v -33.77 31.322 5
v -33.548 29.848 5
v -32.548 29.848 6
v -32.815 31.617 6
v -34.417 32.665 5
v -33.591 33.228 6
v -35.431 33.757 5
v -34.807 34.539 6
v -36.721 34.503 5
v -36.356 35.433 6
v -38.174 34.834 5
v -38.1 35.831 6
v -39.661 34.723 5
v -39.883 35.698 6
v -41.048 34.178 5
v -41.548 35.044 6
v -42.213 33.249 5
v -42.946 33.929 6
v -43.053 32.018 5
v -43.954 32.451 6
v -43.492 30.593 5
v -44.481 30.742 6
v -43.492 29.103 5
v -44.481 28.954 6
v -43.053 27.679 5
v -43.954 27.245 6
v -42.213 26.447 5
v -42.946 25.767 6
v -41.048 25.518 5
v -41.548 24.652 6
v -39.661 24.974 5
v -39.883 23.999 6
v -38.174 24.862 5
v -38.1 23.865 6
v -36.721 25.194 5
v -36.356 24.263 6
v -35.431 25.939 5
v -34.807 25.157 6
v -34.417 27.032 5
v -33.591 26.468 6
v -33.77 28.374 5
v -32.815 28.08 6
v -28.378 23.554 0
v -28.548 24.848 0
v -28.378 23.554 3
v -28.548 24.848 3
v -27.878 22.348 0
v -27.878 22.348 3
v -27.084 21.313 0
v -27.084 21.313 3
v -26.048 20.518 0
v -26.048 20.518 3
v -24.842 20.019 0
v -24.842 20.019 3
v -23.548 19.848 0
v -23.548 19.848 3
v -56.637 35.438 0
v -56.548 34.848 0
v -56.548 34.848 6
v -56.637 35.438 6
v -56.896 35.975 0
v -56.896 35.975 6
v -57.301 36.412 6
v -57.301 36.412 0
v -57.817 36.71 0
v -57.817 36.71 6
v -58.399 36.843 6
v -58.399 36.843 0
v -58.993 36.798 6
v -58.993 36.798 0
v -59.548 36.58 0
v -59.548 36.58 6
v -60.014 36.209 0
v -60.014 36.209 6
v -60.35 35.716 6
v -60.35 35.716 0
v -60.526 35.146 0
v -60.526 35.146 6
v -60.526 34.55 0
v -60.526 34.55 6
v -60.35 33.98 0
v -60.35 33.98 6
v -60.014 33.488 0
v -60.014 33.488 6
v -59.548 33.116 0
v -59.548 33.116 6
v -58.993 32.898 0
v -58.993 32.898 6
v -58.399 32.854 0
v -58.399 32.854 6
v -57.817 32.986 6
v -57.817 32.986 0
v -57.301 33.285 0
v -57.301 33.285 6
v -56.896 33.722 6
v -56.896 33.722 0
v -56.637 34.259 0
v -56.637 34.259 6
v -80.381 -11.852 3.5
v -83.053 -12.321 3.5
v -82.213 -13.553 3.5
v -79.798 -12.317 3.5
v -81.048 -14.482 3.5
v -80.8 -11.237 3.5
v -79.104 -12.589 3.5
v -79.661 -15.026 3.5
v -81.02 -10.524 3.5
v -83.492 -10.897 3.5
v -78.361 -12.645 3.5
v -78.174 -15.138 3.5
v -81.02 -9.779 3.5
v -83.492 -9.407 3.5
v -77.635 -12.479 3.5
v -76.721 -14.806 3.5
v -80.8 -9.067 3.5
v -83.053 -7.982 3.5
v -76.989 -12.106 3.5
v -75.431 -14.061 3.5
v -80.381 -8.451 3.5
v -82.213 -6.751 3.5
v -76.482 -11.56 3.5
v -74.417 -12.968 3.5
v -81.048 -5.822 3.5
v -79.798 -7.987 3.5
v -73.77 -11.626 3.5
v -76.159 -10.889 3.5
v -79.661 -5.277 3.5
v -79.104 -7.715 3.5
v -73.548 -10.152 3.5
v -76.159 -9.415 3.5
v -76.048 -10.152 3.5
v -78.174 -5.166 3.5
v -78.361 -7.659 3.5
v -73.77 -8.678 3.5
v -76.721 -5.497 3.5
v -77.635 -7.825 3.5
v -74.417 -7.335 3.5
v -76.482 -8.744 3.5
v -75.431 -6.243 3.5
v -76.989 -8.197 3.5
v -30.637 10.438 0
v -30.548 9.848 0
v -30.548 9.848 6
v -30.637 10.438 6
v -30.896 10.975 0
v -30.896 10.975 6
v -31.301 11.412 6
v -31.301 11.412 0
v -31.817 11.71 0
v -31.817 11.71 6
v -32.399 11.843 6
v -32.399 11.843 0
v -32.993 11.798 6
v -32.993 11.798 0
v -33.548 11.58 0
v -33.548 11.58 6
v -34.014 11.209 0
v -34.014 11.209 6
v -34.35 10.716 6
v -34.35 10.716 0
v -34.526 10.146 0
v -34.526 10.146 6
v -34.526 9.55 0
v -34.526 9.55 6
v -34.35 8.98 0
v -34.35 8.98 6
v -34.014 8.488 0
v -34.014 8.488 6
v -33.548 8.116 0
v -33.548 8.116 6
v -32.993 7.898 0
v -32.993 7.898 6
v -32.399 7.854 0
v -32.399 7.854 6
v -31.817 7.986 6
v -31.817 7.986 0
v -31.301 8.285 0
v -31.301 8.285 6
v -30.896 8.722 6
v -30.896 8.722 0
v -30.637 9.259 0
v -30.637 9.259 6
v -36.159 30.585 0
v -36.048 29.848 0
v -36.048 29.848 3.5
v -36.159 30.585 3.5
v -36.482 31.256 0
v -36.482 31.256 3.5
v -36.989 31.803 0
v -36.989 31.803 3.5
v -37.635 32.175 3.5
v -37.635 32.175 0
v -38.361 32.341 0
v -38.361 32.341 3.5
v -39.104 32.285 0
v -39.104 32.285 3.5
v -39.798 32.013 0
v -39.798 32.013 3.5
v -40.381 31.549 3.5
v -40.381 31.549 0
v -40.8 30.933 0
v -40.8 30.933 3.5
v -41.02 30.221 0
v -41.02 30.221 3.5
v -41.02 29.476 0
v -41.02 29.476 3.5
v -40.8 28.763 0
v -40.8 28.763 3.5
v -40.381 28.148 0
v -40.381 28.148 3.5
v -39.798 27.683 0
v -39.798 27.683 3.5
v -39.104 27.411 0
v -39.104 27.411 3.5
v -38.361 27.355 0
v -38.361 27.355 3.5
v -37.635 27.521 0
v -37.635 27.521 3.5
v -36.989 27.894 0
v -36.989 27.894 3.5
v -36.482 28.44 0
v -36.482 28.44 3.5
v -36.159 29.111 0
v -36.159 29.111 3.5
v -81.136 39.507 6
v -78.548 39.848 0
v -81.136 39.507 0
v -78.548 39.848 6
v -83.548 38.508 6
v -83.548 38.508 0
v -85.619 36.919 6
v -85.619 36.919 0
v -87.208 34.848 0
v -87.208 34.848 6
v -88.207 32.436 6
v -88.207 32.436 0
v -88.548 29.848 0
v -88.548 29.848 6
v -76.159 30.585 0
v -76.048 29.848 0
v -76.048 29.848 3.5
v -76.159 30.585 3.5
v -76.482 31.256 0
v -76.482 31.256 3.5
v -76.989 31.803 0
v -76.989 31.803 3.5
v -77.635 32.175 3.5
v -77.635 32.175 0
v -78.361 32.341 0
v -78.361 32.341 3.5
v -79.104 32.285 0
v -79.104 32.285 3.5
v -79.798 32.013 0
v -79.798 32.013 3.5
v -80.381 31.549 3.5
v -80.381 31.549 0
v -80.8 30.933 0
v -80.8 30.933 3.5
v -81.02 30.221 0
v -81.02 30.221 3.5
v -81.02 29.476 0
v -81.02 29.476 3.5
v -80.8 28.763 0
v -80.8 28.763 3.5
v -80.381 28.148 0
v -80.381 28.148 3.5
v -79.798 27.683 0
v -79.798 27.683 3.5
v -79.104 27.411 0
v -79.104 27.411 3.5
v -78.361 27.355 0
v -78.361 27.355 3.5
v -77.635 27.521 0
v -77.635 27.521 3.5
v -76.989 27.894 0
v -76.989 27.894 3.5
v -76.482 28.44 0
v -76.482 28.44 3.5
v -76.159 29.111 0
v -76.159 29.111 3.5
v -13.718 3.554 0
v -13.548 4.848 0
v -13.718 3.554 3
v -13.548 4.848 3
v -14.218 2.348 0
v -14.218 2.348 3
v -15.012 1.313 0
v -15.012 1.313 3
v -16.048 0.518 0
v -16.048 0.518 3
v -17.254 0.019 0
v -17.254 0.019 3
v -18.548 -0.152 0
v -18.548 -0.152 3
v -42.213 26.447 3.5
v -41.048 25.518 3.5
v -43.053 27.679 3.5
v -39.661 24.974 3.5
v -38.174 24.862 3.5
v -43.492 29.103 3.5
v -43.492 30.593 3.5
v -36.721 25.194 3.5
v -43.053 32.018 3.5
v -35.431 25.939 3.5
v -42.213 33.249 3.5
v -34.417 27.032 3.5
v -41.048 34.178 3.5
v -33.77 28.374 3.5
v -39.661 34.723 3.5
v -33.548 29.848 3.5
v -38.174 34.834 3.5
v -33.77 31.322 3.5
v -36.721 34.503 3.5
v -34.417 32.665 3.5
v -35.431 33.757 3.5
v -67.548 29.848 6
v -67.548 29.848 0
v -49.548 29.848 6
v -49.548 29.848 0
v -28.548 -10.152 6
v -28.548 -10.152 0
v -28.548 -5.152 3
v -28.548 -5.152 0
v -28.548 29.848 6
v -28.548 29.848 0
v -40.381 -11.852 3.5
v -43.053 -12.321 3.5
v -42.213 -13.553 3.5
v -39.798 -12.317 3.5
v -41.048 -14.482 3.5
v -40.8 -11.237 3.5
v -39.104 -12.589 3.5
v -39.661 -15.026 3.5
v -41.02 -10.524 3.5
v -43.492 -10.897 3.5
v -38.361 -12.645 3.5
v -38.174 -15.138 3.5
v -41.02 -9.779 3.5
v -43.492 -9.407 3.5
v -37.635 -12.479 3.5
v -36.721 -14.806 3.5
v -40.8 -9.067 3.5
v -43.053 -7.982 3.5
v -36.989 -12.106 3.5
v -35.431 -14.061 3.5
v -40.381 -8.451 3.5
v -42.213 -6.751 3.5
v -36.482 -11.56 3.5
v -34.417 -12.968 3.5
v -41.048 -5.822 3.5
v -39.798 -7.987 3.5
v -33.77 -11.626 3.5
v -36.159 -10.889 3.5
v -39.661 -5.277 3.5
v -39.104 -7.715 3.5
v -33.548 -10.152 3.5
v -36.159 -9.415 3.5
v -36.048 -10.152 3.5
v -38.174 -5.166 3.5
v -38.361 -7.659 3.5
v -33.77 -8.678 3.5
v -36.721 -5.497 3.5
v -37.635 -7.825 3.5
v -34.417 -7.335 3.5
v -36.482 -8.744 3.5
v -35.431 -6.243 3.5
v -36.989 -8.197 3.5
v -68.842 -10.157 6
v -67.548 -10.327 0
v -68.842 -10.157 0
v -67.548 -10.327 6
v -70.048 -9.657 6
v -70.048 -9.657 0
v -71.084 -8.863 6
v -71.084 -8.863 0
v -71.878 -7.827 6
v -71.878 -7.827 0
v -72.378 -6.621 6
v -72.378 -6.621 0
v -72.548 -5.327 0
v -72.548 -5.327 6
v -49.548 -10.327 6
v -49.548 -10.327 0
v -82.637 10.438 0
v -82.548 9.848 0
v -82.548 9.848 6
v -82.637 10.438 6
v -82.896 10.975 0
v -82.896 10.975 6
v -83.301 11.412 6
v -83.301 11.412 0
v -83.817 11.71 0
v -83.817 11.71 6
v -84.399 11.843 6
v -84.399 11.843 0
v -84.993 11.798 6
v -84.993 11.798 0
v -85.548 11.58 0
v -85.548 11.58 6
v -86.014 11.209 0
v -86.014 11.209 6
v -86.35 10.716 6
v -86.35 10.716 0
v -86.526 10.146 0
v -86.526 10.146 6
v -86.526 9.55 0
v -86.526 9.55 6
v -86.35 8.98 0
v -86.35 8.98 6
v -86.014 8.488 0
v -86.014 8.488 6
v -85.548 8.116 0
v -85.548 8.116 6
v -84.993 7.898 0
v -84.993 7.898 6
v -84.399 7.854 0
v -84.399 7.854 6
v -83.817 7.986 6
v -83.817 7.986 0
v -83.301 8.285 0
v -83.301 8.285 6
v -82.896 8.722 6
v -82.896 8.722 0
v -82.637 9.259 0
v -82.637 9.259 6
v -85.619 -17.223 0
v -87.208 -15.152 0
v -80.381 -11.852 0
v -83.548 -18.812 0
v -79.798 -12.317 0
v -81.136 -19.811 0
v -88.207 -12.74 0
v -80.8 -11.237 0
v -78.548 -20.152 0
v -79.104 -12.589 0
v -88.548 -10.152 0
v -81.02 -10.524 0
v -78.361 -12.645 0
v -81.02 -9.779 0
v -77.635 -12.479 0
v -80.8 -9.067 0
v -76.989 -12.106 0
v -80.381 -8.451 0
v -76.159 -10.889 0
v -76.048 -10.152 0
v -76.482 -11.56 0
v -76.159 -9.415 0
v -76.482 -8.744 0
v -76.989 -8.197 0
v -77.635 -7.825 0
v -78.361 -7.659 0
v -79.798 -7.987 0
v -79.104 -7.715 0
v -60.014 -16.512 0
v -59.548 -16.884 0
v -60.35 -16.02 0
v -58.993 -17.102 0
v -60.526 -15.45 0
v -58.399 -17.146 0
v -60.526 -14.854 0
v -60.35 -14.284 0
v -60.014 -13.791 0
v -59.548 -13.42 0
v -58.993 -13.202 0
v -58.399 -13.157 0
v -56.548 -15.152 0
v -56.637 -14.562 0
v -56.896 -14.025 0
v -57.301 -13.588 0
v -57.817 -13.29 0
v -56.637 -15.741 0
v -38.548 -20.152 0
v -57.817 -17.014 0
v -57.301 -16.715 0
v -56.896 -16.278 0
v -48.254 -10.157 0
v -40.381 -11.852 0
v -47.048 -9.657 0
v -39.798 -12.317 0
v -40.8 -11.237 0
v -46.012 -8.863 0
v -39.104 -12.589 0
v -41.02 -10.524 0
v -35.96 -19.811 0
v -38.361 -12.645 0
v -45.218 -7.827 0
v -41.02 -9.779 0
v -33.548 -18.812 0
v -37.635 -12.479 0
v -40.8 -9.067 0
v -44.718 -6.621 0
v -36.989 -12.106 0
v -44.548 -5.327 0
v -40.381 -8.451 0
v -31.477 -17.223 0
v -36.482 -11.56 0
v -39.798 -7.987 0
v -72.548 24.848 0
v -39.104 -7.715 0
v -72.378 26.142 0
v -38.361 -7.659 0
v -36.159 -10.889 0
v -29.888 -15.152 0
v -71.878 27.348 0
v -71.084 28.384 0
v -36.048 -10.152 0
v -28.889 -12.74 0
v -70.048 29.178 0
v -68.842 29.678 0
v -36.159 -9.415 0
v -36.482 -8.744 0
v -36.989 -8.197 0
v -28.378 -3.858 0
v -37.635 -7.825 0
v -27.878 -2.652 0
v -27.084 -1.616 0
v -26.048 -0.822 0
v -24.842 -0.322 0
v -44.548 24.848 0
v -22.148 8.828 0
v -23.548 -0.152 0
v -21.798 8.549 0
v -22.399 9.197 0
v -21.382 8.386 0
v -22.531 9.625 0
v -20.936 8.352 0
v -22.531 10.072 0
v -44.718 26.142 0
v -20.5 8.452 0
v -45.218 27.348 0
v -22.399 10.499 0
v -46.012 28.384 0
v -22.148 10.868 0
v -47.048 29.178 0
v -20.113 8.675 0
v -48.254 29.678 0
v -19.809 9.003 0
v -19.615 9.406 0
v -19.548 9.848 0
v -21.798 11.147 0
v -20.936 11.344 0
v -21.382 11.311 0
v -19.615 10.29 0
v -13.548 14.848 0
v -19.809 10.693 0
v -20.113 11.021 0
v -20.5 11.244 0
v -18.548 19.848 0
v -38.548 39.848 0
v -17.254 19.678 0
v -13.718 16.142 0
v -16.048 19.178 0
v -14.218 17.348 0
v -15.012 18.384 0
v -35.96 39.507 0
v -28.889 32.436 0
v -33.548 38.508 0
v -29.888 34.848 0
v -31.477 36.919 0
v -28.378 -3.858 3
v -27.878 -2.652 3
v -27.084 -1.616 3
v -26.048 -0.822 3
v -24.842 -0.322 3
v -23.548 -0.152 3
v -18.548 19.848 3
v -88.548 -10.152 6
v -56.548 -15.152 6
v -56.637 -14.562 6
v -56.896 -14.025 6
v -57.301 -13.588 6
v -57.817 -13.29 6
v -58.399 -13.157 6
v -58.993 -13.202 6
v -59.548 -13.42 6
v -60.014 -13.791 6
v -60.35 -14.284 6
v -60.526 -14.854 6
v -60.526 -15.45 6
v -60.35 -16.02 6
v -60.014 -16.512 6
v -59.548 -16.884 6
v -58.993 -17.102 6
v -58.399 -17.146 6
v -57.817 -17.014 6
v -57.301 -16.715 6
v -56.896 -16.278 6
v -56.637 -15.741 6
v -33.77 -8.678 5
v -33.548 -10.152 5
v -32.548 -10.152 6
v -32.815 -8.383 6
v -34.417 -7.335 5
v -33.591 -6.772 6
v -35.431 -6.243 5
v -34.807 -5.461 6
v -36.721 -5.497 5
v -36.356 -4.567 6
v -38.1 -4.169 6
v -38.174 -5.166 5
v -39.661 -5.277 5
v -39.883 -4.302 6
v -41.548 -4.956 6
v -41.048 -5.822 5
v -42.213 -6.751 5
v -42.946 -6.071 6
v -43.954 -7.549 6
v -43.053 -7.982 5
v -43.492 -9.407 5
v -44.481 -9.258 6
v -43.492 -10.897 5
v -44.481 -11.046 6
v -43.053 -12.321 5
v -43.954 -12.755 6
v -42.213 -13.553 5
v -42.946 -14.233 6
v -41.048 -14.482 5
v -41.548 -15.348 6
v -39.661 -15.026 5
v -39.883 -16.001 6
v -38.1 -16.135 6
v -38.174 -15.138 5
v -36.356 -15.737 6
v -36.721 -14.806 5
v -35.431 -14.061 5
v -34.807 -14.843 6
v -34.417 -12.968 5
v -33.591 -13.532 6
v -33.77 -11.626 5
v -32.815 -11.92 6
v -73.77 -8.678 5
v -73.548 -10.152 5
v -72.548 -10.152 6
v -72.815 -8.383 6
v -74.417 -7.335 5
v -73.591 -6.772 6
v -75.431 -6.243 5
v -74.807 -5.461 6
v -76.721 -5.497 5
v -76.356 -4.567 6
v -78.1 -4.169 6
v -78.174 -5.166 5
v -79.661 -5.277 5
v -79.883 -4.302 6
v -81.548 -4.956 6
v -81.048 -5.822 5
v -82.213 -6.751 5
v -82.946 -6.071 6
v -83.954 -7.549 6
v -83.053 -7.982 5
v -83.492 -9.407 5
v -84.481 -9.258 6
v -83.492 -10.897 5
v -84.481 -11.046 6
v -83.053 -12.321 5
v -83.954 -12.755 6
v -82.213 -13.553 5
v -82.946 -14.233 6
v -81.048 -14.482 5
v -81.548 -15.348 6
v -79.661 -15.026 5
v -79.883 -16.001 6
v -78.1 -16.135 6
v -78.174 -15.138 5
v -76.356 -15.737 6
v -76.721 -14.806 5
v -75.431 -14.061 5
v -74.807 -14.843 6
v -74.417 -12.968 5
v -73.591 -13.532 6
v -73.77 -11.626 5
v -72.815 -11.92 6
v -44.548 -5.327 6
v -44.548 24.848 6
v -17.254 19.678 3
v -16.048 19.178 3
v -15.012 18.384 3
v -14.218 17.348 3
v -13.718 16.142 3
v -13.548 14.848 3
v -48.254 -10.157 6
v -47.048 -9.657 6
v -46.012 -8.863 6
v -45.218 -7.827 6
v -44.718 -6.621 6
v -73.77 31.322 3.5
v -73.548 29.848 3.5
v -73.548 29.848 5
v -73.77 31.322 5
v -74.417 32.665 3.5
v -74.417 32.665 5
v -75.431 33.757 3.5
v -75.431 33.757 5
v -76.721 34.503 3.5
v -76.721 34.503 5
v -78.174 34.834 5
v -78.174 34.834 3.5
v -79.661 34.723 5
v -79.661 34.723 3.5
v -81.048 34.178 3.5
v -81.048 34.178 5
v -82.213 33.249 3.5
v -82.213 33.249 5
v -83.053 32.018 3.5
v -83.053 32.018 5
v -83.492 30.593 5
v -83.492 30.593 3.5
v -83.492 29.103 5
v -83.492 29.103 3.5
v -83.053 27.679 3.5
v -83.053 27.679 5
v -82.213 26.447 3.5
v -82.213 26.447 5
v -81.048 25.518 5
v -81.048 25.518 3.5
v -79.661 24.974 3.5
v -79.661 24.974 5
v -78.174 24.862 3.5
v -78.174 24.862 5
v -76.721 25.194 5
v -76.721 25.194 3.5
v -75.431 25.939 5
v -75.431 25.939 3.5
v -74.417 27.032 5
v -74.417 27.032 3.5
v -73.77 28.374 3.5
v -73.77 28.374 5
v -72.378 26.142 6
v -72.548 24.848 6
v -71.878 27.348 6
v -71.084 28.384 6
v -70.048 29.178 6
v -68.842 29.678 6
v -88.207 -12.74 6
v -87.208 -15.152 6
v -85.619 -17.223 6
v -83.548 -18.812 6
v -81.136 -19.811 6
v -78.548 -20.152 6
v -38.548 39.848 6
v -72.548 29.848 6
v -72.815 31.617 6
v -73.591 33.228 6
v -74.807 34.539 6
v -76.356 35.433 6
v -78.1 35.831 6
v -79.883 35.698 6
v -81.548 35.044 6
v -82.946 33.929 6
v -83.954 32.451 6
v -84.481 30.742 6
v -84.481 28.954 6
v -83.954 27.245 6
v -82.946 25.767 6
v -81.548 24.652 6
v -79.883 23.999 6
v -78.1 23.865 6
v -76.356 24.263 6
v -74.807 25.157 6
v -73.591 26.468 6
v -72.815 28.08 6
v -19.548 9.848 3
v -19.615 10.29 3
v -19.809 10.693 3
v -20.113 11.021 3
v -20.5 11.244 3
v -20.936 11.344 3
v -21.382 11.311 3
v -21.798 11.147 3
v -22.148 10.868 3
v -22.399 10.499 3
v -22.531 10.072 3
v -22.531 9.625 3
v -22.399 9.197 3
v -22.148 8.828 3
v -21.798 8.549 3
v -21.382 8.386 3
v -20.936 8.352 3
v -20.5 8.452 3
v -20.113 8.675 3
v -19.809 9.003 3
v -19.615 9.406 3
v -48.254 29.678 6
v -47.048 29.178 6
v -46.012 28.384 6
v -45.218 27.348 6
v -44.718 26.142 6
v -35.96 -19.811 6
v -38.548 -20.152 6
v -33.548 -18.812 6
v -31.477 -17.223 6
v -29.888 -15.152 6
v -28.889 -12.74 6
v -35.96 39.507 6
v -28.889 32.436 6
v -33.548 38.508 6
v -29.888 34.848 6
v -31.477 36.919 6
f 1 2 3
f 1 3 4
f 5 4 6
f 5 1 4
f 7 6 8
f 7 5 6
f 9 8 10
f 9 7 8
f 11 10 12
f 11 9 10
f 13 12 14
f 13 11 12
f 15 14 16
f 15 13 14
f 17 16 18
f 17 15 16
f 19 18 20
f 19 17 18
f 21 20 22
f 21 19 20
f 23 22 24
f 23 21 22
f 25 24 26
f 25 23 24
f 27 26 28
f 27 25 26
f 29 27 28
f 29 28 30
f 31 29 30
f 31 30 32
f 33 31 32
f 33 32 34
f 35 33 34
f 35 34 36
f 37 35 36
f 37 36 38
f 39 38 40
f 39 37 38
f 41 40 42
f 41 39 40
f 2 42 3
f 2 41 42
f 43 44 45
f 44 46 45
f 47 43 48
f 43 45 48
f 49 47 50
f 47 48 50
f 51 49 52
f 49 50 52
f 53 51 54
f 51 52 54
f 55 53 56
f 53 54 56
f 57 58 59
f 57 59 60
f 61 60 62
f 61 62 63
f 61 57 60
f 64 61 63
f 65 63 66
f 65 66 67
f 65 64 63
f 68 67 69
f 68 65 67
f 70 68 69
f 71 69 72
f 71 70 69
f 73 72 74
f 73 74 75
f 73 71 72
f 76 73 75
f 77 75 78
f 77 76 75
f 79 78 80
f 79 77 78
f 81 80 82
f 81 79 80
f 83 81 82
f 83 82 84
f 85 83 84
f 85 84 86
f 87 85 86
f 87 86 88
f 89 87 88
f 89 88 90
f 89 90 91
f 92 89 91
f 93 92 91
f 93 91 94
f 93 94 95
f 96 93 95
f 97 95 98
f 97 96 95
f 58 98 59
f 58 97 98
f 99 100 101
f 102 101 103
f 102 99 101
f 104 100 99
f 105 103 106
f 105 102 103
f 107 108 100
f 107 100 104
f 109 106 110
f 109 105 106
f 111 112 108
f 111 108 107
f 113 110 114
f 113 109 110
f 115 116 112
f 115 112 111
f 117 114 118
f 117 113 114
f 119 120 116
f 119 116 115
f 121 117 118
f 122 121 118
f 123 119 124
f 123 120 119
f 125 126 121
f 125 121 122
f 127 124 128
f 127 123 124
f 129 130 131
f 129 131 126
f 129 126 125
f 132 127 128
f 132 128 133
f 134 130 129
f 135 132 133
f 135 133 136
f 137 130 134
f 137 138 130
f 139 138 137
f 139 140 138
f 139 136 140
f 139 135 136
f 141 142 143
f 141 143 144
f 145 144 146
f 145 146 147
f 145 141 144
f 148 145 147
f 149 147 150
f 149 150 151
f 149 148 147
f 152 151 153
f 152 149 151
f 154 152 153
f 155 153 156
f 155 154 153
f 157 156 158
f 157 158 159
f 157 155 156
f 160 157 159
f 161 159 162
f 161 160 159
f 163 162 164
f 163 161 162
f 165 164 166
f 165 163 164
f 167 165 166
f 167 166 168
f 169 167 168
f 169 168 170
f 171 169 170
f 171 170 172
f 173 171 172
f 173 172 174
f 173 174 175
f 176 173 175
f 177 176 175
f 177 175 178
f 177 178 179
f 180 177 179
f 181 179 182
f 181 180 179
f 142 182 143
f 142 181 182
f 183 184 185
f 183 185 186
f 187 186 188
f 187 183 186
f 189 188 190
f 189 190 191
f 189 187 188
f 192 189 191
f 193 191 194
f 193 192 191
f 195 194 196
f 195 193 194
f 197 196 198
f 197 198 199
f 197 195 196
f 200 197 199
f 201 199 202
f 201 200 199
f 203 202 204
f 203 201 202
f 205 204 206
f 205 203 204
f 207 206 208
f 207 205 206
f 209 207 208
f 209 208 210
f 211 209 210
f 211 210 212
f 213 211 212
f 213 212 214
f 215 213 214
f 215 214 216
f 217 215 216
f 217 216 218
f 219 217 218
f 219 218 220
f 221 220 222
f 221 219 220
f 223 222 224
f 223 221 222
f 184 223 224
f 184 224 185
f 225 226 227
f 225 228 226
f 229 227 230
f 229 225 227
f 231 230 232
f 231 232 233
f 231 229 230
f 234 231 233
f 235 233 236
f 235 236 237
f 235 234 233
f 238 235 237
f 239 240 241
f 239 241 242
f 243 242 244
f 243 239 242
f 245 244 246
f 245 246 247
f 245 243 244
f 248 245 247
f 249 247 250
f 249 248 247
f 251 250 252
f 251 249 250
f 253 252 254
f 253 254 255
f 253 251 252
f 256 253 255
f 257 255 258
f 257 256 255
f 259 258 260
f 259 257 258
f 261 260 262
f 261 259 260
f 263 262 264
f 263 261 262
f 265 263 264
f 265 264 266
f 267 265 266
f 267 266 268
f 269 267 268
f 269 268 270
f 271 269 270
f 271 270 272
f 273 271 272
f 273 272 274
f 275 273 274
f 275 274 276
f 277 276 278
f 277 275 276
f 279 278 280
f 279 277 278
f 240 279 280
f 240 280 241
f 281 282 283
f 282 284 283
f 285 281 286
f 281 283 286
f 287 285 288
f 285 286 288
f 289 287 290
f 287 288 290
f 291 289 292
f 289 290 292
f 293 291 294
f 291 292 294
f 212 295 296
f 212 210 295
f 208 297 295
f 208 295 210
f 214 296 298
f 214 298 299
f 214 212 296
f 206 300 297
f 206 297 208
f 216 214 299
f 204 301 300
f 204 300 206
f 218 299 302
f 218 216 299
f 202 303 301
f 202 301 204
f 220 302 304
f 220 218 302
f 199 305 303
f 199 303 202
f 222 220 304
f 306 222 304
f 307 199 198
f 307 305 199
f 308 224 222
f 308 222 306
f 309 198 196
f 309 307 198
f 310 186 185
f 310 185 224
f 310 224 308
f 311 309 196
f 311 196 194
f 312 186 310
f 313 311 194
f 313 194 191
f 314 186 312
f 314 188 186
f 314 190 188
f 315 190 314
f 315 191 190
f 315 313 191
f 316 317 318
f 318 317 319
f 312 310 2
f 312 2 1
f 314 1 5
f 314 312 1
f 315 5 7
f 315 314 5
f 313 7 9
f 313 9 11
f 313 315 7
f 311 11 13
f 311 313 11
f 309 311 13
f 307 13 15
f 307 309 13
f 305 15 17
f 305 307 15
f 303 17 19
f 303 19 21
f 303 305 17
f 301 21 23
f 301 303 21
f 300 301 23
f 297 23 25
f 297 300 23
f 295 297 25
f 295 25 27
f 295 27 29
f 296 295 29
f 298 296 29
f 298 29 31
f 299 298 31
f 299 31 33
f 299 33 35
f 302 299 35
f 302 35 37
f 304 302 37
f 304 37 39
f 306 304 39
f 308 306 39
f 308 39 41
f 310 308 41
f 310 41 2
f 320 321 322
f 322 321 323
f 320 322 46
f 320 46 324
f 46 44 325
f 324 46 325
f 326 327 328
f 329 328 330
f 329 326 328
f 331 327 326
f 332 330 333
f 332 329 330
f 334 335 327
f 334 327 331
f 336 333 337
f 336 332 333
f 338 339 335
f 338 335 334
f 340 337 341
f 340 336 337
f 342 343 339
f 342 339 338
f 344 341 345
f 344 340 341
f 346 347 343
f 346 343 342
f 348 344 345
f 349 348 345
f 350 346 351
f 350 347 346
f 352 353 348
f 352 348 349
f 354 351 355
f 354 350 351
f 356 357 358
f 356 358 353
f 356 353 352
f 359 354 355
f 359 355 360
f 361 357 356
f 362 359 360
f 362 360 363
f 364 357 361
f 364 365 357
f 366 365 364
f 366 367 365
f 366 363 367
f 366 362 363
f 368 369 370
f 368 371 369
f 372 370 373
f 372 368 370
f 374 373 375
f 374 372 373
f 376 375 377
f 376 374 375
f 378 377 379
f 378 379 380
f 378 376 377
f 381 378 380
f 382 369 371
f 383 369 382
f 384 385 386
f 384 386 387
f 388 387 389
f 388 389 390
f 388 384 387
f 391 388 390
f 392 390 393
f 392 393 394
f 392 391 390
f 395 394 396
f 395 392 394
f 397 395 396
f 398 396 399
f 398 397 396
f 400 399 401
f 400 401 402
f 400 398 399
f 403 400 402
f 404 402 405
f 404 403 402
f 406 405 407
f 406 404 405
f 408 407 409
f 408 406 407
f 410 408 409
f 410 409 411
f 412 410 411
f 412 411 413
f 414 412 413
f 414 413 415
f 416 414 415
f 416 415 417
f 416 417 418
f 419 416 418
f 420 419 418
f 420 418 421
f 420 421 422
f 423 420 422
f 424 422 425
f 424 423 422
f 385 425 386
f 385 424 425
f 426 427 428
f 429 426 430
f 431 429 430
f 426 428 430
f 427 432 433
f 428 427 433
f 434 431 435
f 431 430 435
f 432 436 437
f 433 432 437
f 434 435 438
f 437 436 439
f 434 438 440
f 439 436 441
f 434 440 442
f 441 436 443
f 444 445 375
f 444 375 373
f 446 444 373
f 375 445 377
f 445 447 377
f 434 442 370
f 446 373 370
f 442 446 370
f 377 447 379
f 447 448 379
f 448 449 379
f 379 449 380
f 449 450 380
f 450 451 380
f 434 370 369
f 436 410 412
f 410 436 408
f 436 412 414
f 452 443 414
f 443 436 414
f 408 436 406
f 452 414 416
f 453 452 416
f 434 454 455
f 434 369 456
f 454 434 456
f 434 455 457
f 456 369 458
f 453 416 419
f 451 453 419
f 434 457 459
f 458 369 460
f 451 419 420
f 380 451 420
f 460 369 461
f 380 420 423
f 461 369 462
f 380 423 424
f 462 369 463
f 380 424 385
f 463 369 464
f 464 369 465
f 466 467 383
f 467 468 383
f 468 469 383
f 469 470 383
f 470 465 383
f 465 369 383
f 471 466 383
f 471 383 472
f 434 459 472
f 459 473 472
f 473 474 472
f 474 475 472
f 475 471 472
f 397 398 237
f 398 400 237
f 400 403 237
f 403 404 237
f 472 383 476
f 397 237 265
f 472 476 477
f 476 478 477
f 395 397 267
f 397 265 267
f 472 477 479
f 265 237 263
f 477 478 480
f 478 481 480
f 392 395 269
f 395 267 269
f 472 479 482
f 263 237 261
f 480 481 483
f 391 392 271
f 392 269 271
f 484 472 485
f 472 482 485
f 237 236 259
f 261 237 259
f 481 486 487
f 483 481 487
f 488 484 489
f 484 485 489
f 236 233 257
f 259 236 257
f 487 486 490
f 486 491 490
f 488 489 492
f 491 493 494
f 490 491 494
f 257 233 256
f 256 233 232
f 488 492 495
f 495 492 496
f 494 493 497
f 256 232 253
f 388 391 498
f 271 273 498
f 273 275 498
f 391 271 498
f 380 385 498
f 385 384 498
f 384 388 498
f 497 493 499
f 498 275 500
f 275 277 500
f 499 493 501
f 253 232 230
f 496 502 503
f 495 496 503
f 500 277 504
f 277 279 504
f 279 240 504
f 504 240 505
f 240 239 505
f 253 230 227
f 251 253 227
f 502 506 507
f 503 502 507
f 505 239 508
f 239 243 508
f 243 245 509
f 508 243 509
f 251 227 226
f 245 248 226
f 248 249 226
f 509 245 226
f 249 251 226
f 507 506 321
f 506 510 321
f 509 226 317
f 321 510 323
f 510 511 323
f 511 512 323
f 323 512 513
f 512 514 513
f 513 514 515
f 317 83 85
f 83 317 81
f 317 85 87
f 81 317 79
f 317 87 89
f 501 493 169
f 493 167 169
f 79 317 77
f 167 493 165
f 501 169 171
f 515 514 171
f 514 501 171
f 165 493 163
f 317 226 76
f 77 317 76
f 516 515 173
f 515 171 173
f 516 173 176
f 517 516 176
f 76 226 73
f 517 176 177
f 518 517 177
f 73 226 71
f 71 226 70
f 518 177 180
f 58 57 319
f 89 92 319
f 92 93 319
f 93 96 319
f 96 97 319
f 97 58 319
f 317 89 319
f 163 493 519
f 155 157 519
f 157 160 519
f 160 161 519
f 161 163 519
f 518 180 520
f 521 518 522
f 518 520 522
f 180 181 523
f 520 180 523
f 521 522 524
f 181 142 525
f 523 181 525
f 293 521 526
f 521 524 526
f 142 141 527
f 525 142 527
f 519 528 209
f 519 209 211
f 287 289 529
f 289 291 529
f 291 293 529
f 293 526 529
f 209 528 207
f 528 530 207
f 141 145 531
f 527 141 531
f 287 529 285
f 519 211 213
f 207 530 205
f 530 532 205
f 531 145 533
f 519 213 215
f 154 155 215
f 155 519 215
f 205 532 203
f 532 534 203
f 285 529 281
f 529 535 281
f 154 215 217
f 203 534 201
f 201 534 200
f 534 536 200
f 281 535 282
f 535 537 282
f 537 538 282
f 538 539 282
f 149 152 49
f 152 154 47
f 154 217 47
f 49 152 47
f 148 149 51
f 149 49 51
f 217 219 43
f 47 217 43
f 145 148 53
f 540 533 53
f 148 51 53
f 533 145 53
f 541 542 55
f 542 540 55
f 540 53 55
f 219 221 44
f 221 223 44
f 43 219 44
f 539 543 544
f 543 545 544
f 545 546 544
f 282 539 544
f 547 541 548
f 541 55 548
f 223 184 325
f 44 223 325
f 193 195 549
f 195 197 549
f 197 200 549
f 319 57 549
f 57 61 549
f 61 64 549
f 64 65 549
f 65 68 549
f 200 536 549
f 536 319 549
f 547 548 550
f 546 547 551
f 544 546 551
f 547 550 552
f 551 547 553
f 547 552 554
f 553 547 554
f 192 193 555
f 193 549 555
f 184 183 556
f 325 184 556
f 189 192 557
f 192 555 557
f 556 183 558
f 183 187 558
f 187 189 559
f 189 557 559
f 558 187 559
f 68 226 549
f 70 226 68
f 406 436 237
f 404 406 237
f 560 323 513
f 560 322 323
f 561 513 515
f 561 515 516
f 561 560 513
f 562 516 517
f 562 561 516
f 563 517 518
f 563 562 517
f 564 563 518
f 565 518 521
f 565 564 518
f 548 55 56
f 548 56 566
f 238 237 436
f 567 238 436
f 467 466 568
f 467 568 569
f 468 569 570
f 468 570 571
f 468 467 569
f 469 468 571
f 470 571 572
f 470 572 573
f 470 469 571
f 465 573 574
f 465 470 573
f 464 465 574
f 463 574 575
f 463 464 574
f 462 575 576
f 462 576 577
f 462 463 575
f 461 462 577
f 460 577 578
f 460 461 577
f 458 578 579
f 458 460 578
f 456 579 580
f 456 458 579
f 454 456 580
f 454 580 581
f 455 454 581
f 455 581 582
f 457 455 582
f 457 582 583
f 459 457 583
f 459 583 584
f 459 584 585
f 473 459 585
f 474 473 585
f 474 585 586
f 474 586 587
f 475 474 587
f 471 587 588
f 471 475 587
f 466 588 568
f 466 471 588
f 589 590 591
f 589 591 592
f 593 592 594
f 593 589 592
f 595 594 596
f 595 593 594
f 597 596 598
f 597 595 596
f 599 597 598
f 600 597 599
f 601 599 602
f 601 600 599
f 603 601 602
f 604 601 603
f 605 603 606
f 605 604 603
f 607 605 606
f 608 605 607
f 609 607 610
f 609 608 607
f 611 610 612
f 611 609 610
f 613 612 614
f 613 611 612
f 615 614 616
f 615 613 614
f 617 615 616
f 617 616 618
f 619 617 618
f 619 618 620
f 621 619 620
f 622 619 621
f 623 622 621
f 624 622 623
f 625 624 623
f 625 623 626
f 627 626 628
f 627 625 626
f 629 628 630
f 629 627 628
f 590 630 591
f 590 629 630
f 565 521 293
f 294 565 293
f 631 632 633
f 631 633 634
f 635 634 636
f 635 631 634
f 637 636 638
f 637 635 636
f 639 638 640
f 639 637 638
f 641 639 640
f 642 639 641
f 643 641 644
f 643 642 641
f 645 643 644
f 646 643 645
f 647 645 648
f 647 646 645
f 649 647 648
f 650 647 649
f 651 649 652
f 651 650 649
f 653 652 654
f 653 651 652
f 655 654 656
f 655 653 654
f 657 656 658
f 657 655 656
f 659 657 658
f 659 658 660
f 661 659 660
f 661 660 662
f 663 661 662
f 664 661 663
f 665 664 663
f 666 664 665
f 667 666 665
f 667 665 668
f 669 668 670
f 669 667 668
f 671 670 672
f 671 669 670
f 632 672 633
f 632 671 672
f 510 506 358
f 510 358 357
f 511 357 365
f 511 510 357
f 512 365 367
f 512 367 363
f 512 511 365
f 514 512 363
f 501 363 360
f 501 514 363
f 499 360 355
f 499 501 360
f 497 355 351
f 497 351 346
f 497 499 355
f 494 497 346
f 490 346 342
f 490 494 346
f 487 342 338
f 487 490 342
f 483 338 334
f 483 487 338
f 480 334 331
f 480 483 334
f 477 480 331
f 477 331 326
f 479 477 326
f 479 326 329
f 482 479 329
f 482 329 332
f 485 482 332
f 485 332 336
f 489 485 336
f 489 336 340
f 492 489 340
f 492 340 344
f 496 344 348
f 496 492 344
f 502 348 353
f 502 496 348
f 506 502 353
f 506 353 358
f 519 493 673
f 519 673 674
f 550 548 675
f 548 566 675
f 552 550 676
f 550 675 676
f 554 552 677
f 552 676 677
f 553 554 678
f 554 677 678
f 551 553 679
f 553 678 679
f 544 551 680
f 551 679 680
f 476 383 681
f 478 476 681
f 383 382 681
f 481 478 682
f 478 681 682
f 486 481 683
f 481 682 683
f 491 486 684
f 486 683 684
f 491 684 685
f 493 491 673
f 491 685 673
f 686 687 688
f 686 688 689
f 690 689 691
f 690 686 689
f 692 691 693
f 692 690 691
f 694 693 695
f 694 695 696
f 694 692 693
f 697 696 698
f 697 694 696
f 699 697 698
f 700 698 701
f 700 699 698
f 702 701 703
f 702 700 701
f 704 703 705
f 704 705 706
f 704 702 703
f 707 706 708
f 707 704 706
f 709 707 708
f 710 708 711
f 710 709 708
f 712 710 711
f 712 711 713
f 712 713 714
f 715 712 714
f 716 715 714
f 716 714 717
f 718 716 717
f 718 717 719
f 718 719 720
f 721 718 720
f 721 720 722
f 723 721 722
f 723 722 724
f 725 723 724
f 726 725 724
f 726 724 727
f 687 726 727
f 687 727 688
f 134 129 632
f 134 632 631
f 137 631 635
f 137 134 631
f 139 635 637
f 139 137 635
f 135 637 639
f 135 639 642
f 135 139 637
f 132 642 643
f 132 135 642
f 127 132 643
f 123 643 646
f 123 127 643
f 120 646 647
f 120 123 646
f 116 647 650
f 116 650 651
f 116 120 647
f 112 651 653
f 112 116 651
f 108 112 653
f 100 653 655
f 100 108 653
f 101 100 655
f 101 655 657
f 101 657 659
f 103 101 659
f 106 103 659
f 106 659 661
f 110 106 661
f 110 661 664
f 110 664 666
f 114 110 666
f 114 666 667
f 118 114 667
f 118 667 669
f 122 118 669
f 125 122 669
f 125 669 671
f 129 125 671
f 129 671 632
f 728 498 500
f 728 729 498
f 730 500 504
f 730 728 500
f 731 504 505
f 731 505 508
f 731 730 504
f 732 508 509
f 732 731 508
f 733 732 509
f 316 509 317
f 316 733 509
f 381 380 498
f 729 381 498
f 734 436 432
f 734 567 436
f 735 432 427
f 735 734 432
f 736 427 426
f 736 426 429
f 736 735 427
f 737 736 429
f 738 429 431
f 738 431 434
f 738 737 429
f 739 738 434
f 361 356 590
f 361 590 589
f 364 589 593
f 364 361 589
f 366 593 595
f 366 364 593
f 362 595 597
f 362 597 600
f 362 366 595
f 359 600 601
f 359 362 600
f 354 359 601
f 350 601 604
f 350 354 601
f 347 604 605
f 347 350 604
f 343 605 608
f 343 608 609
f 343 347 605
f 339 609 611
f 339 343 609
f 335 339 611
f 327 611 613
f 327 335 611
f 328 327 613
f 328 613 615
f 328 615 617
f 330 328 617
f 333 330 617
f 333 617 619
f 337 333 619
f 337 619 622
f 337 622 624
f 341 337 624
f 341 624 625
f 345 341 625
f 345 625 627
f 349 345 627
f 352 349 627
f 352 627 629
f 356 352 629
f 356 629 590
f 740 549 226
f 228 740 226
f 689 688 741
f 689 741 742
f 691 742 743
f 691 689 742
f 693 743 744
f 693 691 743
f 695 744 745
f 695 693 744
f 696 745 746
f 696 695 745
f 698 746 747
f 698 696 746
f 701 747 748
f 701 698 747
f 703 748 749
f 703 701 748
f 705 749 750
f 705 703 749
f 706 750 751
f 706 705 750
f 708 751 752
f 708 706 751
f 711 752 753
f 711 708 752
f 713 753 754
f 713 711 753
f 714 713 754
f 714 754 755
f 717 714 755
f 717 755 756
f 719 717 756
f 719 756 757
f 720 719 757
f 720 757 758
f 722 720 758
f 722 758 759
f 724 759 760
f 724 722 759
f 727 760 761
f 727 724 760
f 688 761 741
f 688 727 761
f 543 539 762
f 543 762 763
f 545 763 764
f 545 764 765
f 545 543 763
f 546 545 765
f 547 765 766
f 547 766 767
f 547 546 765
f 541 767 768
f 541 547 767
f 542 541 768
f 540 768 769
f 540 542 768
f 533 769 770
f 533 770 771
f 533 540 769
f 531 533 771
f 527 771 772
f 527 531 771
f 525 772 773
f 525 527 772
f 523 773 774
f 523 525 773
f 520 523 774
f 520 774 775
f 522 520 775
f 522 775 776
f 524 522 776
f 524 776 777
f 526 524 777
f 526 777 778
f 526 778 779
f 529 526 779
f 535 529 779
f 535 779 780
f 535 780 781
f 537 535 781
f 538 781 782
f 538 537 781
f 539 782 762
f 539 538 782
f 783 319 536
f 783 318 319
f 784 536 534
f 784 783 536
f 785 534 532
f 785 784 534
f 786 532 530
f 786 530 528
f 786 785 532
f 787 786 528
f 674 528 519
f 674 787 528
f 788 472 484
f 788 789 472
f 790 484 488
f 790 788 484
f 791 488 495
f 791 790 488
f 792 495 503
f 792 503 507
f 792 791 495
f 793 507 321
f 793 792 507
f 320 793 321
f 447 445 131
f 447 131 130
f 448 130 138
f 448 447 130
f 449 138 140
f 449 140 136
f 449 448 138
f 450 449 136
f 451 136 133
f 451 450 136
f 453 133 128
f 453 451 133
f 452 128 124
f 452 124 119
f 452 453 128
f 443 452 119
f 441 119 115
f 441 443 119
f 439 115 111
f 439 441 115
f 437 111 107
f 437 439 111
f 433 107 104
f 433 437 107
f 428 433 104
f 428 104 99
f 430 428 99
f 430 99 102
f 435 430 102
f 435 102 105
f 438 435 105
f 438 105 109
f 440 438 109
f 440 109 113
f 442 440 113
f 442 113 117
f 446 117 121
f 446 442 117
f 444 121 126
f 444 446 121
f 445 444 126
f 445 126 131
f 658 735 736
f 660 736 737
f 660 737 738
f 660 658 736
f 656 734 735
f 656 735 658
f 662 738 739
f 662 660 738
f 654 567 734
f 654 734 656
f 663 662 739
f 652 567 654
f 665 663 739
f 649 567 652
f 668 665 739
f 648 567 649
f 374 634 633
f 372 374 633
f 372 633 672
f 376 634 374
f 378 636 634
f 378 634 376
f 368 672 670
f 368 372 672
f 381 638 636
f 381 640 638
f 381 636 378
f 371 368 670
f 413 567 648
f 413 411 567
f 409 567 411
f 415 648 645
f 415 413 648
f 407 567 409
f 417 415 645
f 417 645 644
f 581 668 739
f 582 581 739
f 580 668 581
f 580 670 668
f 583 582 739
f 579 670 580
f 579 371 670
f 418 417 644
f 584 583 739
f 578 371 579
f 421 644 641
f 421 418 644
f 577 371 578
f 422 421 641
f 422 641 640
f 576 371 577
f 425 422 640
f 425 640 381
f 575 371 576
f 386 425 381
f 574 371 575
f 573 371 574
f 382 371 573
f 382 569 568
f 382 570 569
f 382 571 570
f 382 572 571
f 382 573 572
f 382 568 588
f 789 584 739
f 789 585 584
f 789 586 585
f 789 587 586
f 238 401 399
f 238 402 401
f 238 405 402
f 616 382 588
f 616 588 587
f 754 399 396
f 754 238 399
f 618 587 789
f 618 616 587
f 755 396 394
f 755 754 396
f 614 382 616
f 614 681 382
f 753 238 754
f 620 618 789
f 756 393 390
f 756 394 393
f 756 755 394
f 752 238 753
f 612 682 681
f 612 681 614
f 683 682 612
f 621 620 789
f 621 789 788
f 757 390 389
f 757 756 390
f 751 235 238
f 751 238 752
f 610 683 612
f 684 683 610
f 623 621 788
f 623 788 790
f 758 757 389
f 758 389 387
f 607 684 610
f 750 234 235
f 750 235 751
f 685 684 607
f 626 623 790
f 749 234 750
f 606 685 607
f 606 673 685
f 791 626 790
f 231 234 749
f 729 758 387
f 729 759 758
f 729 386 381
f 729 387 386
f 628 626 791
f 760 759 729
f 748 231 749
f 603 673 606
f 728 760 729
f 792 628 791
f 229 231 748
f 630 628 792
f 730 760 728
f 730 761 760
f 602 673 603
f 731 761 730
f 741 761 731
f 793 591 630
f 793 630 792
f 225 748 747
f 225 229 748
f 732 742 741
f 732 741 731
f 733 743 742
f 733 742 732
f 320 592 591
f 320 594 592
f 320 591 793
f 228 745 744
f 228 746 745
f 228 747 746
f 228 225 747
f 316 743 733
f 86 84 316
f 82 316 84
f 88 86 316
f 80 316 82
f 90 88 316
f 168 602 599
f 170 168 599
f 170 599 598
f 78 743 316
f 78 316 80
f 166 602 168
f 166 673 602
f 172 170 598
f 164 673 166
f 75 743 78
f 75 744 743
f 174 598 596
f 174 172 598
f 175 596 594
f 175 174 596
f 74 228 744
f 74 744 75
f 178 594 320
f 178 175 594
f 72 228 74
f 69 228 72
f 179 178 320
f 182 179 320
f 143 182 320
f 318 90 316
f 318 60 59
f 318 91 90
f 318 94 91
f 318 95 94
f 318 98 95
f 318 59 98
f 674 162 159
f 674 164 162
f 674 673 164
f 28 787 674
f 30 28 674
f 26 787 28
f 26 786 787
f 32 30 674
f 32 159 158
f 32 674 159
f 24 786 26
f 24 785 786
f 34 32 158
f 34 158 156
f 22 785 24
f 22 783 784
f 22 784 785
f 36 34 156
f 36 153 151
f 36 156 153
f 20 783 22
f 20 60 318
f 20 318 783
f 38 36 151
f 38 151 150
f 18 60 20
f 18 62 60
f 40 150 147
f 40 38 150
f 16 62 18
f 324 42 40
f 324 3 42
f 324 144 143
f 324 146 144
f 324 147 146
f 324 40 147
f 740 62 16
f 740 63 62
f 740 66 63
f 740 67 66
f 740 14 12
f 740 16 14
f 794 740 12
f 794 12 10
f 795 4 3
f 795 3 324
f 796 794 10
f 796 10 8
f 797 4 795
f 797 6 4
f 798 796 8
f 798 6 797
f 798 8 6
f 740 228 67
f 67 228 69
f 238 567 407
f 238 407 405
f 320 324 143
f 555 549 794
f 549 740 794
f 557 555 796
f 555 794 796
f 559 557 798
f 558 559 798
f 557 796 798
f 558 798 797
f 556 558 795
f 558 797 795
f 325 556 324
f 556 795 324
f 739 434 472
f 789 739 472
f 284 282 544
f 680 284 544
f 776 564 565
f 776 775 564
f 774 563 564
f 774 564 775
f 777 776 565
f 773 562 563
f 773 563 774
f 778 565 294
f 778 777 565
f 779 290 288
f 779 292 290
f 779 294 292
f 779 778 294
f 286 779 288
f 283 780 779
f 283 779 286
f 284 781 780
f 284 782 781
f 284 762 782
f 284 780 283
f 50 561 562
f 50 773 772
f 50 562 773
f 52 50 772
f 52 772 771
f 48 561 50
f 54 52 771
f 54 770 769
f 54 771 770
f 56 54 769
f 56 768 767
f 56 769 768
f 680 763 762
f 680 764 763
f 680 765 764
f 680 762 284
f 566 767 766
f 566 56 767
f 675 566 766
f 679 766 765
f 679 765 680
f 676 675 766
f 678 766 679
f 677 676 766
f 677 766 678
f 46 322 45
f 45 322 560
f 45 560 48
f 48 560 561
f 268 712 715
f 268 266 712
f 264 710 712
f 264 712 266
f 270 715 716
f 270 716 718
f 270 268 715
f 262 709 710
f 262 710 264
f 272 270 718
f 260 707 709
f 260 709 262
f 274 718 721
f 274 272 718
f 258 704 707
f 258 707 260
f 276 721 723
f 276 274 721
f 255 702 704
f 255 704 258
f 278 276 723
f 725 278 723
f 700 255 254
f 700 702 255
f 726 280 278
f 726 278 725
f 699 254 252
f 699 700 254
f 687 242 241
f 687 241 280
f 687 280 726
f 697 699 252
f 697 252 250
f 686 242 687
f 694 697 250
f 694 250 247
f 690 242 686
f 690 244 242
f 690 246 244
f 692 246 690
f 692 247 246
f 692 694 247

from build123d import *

# Parameters (mm, degrees)
F0_R     = 5
F0_R_2   = 2
F0_W     = 28
F0_H     = 40.175457
F1_DEPTH = 6
F0_R_3   = 2.5
F2_DEPTH = 3.5
F0_W_2   = 15
F0_H_2   = 20
F0_R_4   = 1.5
F3_DEPTH = 3
F4_R     = 10
F5_R     = 5
F6_SIZE  = 1


with BuildPart() as f1:
    # F0 (on Top) → F1 (new body)
    with BuildSketch(Plane.XY):
        Polygon((-28.548011, 39.848171), (-88.548011, 39.848171), (-88.548011, -20.151829), (-28.548011, -20.151829), (-28.548011, -0.151829), (-28.548011, 19.848171), align=None)
        with Locations((-78.548011, -10.151829)):
            Circle(F0_R, mode=Mode.SUBTRACT)
        with Locations((-58.548011, -15.151829)):
            Circle(F0_R_2, mode=Mode.SUBTRACT)
        with Locations((-84.548011, 9.848171)):
            Circle(F0_R_2, mode=Mode.SUBTRACT)
        with Locations((-58.548011, 9.760442)):
            Rectangle(F0_W, F0_H, mode=Mode.SUBTRACT)
        with Locations((-38.548011, -10.151829)):
            Circle(F0_R, mode=Mode.SUBTRACT)
        with Locations((-78.548011, 29.848171)):
            Circle(F0_R, mode=Mode.SUBTRACT)
        with Locations((-58.548011, 34.848171)):
            Circle(F0_R_2, mode=Mode.SUBTRACT)
        with Locations((-32.548011, 9.848171)):
            Circle(F0_R_2, mode=Mode.SUBTRACT)
        with Locations((-38.548011, 29.848171)):
            Circle(F0_R, mode=Mode.SUBTRACT)
    extrude(amount=F1_DEPTH)

    # F0 (on Top) → F2 (join)
    with BuildSketch(Plane.XY):
        with Locations((-78.548011, 29.848171)):
            Circle(F0_R)
        with Locations((-78.548011, 29.848171)):
            Circle(F0_R_3, mode=Mode.SUBTRACT)
        with Locations((-78.548011, -10.151829)):
            Circle(F0_R)
        with Locations((-78.548011, -10.151829)):
            Circle(F0_R_3, mode=Mode.SUBTRACT)
        with Locations((-38.548011, 29.848171)):
            Circle(F0_R)
        with Locations((-38.548011, 29.848171)):
            Circle(F0_R_3, mode=Mode.SUBTRACT)
        with Locations((-38.548011, -10.151829)):
            Circle(F0_R)
        with Locations((-38.548011, -10.151829)):
            Circle(F0_R_3, mode=Mode.SUBTRACT)
    extrude(amount=F2_DEPTH)

    # F0 (on Top) → F3 (join)
    with BuildSketch(Plane.XY):
        with Locations((-21.048011, 9.848171)):
            Rectangle(F0_W_2, F0_H_2)
        with Locations((-21.048011, 9.848171)):
            Circle(F0_R_4, mode=Mode.SUBTRACT)
    extrude(amount=F3_DEPTH)

    # F4
    f4_edges = [f1.edges().sort_by_distance(p)[0] for p in [
        (-88.548011, 39.848171, 3),
        (-88.548011, -20.151829, 3),
        (-28.548011, -20.151829, 3),
        (-28.548011, 39.848171, 3),
    ]]
    fillet(f4_edges, radius=F4_R)

    # F5
    f5_edges = [f1.edges().sort_by_distance(p)[0] for p in [
        (-44.548011, 29.848171, 3),
        (-72.548011, 29.848171, 3),
        (-72.548011, -10.327286, 3),
        (-44.548011, -10.327286, 3),
        (-28.548011, -0.151829, 1.5),
        (-28.548011, 19.848171, 1.5),
        (-13.548011, -0.151829, 1.5),
        (-13.548011, 19.848171, 1.5),
    ]]
    fillet(f5_edges, radius=F5_R)

    # F6
    f6_edges = [f1.edges().sort_by_distance(p)[0] for p in [
        (-83.548011, 29.848171, 6),
        (-83.548011, -10.151829, 6),
        (-43.548011, 29.848171, 6),
        (-43.548011, -10.151829, 6),
    ]]
    chamfer(f6_edges, length=F6_SIZE)


solid = f1.part
